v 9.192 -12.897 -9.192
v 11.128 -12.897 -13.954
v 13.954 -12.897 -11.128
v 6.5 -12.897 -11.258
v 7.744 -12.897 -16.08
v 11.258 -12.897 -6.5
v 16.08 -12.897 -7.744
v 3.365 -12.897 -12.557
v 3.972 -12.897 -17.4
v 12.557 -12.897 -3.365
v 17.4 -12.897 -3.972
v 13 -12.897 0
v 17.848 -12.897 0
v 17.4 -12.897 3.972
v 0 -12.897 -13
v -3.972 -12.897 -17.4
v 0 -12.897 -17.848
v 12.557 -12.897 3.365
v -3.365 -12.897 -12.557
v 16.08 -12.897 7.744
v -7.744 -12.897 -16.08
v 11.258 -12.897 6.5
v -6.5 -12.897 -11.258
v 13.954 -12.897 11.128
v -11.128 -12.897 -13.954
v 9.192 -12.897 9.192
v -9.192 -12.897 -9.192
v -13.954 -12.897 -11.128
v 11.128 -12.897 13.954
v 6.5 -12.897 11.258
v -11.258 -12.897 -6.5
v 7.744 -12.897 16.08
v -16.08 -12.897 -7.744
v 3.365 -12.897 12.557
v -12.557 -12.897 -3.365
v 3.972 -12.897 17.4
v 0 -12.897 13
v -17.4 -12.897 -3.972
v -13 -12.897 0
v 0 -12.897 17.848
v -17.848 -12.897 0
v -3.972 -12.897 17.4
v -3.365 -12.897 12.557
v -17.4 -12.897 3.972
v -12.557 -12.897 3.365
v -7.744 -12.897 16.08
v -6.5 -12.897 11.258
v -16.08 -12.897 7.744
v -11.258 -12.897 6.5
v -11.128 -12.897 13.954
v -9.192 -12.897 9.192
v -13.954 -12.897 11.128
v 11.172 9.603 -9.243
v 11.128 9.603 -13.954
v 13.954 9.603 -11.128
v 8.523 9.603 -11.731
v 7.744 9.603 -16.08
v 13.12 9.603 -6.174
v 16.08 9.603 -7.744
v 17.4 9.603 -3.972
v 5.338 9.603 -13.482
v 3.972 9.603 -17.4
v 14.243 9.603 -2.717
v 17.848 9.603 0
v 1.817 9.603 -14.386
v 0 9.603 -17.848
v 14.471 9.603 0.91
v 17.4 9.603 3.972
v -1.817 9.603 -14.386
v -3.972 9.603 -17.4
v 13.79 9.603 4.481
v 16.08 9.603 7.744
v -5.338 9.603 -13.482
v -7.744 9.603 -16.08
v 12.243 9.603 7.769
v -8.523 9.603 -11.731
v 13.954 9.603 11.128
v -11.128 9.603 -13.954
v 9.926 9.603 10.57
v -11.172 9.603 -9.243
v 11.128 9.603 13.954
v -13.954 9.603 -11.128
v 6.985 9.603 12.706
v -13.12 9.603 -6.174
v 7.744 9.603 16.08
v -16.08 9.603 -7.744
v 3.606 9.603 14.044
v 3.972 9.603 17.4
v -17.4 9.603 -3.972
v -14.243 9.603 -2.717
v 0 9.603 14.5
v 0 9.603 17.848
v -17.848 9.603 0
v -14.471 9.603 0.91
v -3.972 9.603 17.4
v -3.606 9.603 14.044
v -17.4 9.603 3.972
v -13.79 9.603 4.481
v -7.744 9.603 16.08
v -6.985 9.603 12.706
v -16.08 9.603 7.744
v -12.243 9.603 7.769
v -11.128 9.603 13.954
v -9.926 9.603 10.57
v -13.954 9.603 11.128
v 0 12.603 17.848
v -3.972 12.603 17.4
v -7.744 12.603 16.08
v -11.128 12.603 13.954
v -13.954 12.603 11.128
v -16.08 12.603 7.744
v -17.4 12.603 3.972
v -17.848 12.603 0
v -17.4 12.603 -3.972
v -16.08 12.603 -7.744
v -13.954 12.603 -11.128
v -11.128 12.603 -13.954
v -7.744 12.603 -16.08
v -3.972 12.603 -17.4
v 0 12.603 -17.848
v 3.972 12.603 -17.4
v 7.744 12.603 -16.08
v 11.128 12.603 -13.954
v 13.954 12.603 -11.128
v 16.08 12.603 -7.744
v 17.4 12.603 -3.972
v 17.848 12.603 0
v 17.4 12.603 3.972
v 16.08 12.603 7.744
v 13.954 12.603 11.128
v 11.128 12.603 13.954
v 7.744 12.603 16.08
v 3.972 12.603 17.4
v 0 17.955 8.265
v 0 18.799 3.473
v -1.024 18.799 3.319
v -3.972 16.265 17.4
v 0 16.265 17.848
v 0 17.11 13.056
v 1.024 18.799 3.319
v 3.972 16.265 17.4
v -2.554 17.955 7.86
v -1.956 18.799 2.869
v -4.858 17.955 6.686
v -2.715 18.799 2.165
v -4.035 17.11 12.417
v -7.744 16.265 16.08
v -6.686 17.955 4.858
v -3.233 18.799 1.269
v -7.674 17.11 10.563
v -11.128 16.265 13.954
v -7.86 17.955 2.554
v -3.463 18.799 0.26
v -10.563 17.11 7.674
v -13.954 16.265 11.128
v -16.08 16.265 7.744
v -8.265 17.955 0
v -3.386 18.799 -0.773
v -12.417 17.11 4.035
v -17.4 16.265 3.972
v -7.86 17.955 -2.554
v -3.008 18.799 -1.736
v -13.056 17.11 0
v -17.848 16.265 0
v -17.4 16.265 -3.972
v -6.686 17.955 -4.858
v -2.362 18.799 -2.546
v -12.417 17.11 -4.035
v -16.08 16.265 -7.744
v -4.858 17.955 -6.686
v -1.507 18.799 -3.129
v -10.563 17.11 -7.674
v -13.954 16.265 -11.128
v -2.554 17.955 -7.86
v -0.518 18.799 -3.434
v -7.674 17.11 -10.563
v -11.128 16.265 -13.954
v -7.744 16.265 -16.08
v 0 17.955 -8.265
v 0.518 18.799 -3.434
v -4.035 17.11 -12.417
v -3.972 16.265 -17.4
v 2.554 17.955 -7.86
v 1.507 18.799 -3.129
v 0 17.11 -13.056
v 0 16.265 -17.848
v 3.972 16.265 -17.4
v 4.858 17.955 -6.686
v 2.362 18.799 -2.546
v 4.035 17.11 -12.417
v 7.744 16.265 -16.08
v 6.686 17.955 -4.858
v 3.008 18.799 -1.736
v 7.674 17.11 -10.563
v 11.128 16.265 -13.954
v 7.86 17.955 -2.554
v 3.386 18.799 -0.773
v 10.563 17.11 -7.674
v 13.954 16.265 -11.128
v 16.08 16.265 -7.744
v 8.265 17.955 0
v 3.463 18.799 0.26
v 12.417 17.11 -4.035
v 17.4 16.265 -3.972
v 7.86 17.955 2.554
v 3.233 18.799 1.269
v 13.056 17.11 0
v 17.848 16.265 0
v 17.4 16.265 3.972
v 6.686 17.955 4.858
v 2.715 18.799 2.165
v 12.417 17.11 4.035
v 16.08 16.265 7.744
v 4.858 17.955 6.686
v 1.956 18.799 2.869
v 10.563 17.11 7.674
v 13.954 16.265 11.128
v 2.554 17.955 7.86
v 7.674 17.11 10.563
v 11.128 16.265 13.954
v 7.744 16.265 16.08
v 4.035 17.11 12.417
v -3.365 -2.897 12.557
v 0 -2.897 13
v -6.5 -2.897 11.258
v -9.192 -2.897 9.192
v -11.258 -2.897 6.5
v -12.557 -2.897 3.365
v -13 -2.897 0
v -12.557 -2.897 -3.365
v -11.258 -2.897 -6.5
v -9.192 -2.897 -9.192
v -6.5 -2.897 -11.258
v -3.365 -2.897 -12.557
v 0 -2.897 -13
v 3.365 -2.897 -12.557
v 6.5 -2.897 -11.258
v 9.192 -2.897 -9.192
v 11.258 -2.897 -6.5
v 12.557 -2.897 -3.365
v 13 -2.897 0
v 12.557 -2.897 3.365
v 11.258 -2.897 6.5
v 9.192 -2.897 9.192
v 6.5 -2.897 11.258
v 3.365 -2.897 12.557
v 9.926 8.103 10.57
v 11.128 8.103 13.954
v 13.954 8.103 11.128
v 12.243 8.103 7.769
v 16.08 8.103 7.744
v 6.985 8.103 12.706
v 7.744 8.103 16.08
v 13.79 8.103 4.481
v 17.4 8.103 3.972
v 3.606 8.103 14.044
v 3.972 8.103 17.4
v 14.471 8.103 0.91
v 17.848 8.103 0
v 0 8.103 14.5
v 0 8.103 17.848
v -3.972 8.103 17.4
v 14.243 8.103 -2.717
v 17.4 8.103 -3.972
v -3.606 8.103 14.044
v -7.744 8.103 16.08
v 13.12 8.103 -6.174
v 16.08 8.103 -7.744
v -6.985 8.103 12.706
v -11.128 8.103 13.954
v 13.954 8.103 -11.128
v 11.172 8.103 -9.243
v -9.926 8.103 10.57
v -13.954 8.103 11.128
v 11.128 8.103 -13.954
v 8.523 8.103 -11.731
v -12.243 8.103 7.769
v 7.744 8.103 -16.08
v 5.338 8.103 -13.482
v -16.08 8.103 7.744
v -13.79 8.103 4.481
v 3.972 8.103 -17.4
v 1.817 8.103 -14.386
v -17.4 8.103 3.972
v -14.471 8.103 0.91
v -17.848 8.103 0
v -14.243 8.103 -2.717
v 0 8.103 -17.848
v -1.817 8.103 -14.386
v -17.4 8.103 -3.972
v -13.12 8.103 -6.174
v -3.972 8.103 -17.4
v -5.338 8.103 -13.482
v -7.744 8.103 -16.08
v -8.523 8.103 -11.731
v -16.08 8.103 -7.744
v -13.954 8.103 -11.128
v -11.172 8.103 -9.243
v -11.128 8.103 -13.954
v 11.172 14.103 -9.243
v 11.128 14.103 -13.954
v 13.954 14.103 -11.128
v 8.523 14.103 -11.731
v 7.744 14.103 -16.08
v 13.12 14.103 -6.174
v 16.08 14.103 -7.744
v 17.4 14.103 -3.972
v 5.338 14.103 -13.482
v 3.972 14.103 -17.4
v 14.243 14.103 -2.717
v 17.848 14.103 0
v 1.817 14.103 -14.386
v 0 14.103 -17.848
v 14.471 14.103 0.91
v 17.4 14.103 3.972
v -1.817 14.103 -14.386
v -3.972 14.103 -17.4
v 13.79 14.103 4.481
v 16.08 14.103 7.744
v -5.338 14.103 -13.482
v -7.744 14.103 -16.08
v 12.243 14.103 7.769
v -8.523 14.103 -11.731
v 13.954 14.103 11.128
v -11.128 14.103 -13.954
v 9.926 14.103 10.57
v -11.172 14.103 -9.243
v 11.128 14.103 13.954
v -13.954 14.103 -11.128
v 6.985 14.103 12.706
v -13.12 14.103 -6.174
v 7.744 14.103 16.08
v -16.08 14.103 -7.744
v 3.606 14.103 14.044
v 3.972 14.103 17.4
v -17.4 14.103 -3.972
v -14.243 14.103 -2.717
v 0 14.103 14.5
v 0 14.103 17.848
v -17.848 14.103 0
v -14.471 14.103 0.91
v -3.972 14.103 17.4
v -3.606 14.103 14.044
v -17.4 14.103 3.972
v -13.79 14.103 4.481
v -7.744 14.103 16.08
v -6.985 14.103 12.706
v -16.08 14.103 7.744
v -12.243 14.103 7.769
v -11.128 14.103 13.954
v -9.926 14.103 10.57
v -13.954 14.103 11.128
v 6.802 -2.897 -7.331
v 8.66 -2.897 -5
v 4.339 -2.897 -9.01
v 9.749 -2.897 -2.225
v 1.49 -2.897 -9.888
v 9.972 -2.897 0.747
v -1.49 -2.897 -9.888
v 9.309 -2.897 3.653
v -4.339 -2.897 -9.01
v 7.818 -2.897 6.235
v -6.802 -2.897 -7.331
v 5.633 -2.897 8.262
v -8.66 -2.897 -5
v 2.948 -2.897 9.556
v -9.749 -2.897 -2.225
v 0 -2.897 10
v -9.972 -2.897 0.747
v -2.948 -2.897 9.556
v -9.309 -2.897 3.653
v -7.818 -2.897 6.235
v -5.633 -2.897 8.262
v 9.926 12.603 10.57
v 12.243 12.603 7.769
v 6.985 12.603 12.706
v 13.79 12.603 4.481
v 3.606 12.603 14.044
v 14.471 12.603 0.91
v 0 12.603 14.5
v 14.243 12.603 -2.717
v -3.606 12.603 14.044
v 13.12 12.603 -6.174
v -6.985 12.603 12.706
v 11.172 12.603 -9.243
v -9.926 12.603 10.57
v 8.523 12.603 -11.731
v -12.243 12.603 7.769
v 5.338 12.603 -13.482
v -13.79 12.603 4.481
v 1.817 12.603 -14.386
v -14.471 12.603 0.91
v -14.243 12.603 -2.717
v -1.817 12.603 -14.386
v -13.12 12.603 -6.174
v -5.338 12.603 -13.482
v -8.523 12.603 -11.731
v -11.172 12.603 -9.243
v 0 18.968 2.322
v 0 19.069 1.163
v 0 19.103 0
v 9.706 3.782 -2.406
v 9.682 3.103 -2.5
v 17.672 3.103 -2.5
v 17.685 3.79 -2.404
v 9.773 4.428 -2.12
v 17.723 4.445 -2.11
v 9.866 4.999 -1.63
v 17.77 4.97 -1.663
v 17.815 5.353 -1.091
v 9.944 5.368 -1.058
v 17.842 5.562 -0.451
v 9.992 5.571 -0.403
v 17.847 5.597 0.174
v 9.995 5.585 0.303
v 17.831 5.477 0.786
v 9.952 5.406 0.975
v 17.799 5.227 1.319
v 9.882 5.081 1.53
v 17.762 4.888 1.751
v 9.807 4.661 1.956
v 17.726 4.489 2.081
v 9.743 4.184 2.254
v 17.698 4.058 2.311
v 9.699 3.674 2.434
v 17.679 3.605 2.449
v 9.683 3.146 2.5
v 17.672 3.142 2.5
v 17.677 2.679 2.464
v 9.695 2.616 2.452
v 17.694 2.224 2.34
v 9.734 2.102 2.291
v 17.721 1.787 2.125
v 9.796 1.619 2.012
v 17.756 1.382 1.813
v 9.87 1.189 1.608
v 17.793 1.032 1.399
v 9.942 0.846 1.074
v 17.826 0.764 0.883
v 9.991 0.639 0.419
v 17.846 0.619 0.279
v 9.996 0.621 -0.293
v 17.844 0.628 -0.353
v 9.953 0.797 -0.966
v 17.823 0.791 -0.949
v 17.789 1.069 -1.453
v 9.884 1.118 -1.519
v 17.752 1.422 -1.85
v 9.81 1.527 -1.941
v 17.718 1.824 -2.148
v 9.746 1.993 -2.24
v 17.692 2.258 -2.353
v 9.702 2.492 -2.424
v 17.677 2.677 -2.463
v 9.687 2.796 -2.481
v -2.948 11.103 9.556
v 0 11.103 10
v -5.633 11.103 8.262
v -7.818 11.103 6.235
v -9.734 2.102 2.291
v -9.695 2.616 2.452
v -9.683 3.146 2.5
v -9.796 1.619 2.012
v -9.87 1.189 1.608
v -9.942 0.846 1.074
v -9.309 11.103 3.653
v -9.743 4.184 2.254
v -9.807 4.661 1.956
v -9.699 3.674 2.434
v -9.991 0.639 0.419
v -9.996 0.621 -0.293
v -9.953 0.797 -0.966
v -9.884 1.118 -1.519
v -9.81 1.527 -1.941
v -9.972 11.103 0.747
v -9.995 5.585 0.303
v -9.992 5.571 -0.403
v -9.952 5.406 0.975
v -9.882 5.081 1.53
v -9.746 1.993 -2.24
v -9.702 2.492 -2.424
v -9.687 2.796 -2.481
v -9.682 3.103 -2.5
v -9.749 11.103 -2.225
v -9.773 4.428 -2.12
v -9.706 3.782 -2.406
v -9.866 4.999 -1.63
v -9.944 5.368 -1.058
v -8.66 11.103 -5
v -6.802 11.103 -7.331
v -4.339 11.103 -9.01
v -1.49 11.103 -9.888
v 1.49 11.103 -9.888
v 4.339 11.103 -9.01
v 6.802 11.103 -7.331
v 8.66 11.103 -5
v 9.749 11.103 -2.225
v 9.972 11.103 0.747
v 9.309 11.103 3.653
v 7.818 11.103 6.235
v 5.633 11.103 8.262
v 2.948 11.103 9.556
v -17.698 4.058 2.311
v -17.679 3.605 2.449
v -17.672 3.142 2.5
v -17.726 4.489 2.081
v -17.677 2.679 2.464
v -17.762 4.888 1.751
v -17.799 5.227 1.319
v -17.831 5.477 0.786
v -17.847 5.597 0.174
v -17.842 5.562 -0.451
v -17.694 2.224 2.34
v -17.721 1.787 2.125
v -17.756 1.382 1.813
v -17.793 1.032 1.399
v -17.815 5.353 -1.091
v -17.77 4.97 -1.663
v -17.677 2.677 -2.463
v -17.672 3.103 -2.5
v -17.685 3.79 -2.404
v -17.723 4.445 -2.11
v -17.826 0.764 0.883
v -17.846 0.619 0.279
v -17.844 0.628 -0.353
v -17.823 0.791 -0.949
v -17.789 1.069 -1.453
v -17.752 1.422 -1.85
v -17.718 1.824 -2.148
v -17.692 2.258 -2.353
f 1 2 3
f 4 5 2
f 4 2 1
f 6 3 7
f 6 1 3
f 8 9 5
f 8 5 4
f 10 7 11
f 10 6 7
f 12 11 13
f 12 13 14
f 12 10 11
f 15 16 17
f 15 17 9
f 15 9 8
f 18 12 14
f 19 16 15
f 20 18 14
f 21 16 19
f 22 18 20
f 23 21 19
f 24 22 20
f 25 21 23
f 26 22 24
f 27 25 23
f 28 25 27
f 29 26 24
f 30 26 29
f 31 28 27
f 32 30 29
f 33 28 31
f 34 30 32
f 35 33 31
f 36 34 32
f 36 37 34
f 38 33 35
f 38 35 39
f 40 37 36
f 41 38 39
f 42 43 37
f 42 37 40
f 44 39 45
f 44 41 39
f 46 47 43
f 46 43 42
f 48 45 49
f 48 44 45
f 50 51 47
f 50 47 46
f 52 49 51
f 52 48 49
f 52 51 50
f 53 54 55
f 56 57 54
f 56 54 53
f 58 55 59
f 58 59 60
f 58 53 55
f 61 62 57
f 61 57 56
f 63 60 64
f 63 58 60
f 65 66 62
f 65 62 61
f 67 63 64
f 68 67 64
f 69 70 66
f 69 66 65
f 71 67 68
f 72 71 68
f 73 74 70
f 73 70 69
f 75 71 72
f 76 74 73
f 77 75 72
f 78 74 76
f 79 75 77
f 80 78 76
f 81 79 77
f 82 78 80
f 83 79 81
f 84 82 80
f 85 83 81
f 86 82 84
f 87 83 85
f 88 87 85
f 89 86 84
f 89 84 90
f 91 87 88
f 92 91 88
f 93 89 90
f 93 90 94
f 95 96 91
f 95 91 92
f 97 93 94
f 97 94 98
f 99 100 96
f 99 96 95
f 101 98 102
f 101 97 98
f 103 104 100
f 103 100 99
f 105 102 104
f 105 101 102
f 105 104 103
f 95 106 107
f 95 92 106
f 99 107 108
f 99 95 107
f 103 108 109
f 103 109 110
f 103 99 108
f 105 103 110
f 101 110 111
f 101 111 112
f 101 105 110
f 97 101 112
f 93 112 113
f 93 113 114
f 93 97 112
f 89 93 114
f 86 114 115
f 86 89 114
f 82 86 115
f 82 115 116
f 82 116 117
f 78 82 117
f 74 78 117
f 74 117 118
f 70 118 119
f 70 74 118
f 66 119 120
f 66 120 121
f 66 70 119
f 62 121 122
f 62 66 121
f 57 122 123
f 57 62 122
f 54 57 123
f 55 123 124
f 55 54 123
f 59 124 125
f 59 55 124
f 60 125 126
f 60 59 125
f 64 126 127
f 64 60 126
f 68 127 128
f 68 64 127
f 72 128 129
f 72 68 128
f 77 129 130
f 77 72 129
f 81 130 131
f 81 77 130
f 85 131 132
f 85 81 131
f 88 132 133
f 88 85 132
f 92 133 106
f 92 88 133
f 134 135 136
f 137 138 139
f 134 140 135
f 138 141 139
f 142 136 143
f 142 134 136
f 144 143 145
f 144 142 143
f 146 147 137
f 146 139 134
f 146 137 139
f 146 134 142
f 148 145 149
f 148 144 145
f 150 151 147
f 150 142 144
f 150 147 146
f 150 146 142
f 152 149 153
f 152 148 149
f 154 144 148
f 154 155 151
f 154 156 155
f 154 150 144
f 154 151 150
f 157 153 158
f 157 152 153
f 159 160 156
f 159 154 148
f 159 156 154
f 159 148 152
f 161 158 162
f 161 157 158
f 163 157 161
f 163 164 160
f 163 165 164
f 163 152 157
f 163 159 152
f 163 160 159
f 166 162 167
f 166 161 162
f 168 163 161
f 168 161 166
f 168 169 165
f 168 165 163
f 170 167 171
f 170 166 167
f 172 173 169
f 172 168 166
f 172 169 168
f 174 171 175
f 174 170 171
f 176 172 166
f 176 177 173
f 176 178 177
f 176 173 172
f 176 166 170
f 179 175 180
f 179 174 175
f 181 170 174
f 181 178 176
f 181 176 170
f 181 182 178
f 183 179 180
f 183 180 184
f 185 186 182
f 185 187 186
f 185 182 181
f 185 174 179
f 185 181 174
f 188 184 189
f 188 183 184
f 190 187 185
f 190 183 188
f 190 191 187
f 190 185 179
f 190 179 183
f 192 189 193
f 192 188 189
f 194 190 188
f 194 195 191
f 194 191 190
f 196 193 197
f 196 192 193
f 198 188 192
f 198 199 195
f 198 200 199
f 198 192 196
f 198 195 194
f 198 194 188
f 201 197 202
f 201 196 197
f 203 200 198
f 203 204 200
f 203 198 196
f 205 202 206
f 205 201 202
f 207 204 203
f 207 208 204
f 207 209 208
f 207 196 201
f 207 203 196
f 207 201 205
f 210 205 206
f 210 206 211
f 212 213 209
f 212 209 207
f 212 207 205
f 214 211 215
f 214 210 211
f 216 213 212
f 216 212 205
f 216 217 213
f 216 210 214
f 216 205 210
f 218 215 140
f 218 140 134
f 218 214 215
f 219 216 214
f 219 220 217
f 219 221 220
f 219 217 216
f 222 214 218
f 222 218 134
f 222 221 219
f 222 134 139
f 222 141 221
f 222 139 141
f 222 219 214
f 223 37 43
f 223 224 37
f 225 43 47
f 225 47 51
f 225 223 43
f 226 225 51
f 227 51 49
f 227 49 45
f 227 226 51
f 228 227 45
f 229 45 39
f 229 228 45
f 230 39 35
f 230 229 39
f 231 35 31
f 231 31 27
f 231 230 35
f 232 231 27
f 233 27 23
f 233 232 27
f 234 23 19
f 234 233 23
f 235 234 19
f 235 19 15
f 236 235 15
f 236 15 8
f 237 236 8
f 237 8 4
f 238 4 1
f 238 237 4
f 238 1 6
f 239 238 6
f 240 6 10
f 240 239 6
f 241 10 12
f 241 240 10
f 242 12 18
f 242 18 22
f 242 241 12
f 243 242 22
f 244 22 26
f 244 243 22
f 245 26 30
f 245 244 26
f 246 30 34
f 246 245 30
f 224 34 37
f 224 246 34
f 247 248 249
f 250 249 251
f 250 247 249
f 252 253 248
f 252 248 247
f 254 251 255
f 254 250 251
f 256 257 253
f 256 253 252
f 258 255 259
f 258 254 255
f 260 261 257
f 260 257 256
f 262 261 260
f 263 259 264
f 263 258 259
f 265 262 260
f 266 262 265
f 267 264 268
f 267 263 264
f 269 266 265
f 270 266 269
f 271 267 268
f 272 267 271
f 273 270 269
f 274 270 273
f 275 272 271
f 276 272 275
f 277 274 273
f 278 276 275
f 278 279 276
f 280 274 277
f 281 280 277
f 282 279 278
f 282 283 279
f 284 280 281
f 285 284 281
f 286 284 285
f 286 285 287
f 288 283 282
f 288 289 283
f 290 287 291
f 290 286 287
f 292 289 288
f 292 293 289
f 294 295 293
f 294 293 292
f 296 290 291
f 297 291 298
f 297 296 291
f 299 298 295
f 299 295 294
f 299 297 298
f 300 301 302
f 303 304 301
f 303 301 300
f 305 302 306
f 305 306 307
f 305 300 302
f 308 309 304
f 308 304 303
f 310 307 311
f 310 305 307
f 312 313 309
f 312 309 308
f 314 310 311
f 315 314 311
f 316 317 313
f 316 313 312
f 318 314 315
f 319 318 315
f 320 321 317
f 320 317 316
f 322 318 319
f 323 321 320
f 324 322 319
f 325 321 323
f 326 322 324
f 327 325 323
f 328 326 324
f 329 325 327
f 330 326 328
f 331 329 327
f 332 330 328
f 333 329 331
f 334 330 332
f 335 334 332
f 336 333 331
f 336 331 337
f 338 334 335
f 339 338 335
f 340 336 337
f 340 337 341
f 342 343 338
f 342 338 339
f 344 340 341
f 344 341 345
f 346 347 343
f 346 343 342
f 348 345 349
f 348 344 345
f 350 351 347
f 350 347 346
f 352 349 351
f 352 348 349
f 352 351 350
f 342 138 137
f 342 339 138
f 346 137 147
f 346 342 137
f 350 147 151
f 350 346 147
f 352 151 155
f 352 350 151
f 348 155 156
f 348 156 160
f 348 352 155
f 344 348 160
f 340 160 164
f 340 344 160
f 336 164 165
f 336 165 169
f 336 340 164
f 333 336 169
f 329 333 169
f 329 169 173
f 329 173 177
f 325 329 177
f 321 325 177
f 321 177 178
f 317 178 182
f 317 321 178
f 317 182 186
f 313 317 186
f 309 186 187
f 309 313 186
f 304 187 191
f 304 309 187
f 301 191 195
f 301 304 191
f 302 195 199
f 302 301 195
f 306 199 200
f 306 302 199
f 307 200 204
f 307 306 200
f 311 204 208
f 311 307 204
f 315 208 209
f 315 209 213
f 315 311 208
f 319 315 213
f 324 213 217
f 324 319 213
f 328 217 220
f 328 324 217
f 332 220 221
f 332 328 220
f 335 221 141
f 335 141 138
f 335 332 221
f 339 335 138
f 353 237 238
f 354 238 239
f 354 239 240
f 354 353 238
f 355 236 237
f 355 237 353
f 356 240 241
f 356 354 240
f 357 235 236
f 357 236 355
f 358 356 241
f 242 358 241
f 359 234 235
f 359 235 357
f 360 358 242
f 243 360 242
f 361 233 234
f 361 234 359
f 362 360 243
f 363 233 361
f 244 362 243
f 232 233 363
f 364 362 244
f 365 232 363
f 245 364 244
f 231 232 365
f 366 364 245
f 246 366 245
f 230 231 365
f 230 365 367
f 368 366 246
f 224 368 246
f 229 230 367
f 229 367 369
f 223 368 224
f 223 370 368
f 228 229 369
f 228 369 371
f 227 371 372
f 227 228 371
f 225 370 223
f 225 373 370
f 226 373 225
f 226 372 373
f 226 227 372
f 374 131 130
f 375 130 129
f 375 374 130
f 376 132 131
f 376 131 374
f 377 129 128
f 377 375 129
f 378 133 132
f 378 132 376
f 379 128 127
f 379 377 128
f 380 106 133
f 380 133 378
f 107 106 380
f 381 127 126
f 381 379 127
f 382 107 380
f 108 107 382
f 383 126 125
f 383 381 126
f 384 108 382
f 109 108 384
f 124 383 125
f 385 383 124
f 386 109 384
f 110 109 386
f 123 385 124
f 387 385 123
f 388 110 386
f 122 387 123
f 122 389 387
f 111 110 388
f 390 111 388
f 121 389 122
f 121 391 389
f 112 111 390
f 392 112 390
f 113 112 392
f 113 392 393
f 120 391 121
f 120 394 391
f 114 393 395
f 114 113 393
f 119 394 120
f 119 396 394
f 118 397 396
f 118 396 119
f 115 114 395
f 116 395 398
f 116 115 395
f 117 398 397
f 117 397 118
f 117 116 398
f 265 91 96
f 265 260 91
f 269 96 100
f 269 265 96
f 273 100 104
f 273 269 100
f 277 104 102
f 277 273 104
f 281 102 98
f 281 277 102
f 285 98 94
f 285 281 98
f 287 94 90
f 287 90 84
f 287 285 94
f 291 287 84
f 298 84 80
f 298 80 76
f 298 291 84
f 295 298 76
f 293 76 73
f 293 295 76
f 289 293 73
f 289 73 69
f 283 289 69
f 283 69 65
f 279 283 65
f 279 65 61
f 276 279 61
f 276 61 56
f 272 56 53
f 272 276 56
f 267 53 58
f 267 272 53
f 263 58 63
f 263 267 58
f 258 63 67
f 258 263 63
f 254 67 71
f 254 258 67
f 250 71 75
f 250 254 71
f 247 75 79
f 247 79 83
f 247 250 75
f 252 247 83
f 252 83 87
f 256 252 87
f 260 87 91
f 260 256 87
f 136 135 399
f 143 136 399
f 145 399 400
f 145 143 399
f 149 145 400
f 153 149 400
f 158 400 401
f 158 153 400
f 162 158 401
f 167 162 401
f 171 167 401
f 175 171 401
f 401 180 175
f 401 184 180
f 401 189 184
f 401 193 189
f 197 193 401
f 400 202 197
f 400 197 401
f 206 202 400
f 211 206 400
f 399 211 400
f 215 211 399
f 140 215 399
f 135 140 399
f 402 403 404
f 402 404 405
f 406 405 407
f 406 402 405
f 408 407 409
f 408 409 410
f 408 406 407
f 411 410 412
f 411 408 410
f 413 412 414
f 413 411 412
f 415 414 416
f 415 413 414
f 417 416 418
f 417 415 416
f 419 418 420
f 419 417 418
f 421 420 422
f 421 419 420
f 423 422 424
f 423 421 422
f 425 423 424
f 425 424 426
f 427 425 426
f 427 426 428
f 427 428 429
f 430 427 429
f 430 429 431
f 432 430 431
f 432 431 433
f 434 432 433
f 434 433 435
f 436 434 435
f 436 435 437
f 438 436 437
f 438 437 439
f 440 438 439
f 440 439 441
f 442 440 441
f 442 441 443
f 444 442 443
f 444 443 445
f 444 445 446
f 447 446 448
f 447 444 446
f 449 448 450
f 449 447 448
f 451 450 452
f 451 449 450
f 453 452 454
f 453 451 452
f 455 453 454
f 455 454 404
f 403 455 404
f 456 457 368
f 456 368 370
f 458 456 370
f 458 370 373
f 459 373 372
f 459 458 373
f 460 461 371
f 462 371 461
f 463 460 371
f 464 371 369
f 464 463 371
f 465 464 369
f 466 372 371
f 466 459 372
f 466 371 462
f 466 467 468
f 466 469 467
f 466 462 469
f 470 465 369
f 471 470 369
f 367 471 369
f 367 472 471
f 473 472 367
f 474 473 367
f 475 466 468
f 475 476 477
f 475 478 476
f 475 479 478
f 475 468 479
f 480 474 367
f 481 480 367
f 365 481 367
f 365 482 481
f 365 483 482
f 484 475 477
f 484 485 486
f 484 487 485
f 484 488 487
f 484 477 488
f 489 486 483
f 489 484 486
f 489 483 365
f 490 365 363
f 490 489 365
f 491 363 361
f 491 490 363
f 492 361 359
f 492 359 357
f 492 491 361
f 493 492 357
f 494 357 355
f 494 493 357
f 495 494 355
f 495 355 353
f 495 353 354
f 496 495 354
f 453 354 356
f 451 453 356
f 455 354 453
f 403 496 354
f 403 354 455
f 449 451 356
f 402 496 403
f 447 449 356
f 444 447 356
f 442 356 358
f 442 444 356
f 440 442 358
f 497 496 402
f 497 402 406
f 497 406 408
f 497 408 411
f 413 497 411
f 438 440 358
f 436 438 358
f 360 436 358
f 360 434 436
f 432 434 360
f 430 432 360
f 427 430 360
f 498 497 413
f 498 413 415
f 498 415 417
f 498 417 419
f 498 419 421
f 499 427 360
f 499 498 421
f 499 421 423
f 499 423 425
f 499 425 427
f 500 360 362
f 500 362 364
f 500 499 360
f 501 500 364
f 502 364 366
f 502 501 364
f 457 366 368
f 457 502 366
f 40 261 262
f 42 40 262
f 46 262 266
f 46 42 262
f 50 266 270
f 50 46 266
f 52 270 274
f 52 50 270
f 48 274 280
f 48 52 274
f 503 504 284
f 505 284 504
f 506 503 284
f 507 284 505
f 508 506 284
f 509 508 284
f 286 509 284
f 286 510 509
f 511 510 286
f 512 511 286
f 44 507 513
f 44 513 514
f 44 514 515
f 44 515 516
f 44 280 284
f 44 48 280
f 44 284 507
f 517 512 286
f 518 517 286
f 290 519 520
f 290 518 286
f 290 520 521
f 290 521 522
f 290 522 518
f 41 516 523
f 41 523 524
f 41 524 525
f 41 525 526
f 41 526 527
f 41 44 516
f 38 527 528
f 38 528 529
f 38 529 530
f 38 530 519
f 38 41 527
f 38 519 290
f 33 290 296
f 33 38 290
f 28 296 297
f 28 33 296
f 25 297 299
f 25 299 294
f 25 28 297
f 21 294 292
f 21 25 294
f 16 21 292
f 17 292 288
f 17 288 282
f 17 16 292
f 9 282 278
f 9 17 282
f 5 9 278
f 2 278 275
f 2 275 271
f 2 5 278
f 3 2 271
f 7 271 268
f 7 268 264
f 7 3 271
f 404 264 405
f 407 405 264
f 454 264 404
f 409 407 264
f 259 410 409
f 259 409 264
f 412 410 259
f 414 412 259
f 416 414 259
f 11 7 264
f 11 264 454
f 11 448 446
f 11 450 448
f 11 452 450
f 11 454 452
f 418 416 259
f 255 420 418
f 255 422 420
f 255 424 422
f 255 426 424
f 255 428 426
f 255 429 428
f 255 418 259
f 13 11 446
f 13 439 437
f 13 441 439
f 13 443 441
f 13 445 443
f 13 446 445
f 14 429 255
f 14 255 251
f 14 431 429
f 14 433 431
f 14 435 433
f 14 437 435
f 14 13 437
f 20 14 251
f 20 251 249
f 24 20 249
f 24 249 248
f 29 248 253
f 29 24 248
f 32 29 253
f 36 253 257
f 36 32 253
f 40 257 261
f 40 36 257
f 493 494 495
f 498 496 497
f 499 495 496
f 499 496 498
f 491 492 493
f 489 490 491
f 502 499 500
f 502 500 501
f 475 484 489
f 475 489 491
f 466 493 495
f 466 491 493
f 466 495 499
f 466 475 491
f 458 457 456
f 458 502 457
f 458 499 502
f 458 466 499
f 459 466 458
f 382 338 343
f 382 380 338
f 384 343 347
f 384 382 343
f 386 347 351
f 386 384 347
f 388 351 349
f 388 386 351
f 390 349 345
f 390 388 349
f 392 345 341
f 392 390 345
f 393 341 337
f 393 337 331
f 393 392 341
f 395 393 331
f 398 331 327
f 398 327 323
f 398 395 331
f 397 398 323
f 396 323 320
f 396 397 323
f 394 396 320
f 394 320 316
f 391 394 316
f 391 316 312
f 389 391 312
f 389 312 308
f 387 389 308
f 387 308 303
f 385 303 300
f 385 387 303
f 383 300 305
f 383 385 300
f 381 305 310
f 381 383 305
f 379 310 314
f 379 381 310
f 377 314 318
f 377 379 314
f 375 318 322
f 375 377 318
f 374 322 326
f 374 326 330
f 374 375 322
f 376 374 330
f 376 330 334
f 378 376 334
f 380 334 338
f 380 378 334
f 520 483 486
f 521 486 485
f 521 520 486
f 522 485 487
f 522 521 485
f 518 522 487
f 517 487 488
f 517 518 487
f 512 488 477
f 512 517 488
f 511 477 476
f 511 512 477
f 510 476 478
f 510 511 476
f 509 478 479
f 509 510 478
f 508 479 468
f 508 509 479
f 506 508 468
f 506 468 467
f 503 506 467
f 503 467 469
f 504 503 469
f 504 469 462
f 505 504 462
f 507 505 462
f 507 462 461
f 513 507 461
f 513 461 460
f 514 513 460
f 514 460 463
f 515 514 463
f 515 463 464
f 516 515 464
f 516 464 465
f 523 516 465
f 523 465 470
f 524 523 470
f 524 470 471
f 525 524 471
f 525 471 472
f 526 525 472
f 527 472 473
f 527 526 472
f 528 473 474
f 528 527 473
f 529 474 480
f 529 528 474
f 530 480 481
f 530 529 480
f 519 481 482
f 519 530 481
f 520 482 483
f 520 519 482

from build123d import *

# Parameters (mm, degrees)
CUT_EXTRUDE1_DEPTH      = 32.654993342
CUT_EXTRUDE1_DEPTH_BACK = 32.654993342
SKETCH3_R               = 2.5


with BuildPart() as part:
    # Sketch2 → Revolve1 (revolve)
    with BuildSketch(Plane.XY, mode=Mode.PRIVATE) as revolve1_sk:
        with BuildLine():
            Line((-17.847985654, 8.103335303), (-17.847985654, -12.896664697))
            Line((-17.847985654, -12.896664697), (-13, -12.896664697))
            Line((-13, -12.896664697), (-13, -2.896664697))
            Line((-13, -2.896664697), (-10, -2.896664697))
            Line((-10, -2.896664697), (-10, 11.103335303))
            Line((-10, 11.103335303), (0, 11.103335303))
            Line((0, 11.103335303), (0, 19.103335303))
            ThreePointArc((0, 19.103335303), (-1.743114855, 19.027229265), (-3.472963553, 18.799490363))
            Line((-3.472963553, 18.799490363), (-17.847985654, 16.264786119))
            Line((-17.847985654, 16.264786119), (-17.847985654, 14.103335303))
            Line((-17.847985654, 14.103335303), (-14.5, 14.103335303))
            Line((-14.5, 14.103335303), (-14.5, 12.603335303))
            Line((-14.5, 12.603335303), (-17.847985654, 12.603335303))
            Line((-17.847985654, 12.603335303), (-17.847985654, 9.603335303))
            Line((-17.847985654, 9.603335303), (-14.5, 9.603335303))
            Line((-14.5, 9.603335303), (-14.5, 8.103335303))
            Line((-14.5, 8.103335303), (-17.847985654, 8.103335303))
        make_face()
    revolve(revolve1_sk.sketch.rotate(Axis((0, 24.760398889, 0), (0, -1, 0)), 270), axis=Axis((0, 24.760398889, 0), (0, -1, 0)))

    # Sketch3 → Cut-Extrude1 (cut, two sides: drawn at the far end of the back side and taken through both)
    with BuildSketch(Plane(origin=(0, 0, 0), x_dir=(0, 0, -1), z_dir=(1, 0, 0)).offset(-CUT_EXTRUDE1_DEPTH_BACK)):
        with Locations((0, 3.103335303)):
            Circle(SKETCH3_R)
    extrude(amount=CUT_EXTRUDE1_DEPTH + CUT_EXTRUDE1_DEPTH_BACK, mode=Mode.SUBTRACT)


solid = part.part
